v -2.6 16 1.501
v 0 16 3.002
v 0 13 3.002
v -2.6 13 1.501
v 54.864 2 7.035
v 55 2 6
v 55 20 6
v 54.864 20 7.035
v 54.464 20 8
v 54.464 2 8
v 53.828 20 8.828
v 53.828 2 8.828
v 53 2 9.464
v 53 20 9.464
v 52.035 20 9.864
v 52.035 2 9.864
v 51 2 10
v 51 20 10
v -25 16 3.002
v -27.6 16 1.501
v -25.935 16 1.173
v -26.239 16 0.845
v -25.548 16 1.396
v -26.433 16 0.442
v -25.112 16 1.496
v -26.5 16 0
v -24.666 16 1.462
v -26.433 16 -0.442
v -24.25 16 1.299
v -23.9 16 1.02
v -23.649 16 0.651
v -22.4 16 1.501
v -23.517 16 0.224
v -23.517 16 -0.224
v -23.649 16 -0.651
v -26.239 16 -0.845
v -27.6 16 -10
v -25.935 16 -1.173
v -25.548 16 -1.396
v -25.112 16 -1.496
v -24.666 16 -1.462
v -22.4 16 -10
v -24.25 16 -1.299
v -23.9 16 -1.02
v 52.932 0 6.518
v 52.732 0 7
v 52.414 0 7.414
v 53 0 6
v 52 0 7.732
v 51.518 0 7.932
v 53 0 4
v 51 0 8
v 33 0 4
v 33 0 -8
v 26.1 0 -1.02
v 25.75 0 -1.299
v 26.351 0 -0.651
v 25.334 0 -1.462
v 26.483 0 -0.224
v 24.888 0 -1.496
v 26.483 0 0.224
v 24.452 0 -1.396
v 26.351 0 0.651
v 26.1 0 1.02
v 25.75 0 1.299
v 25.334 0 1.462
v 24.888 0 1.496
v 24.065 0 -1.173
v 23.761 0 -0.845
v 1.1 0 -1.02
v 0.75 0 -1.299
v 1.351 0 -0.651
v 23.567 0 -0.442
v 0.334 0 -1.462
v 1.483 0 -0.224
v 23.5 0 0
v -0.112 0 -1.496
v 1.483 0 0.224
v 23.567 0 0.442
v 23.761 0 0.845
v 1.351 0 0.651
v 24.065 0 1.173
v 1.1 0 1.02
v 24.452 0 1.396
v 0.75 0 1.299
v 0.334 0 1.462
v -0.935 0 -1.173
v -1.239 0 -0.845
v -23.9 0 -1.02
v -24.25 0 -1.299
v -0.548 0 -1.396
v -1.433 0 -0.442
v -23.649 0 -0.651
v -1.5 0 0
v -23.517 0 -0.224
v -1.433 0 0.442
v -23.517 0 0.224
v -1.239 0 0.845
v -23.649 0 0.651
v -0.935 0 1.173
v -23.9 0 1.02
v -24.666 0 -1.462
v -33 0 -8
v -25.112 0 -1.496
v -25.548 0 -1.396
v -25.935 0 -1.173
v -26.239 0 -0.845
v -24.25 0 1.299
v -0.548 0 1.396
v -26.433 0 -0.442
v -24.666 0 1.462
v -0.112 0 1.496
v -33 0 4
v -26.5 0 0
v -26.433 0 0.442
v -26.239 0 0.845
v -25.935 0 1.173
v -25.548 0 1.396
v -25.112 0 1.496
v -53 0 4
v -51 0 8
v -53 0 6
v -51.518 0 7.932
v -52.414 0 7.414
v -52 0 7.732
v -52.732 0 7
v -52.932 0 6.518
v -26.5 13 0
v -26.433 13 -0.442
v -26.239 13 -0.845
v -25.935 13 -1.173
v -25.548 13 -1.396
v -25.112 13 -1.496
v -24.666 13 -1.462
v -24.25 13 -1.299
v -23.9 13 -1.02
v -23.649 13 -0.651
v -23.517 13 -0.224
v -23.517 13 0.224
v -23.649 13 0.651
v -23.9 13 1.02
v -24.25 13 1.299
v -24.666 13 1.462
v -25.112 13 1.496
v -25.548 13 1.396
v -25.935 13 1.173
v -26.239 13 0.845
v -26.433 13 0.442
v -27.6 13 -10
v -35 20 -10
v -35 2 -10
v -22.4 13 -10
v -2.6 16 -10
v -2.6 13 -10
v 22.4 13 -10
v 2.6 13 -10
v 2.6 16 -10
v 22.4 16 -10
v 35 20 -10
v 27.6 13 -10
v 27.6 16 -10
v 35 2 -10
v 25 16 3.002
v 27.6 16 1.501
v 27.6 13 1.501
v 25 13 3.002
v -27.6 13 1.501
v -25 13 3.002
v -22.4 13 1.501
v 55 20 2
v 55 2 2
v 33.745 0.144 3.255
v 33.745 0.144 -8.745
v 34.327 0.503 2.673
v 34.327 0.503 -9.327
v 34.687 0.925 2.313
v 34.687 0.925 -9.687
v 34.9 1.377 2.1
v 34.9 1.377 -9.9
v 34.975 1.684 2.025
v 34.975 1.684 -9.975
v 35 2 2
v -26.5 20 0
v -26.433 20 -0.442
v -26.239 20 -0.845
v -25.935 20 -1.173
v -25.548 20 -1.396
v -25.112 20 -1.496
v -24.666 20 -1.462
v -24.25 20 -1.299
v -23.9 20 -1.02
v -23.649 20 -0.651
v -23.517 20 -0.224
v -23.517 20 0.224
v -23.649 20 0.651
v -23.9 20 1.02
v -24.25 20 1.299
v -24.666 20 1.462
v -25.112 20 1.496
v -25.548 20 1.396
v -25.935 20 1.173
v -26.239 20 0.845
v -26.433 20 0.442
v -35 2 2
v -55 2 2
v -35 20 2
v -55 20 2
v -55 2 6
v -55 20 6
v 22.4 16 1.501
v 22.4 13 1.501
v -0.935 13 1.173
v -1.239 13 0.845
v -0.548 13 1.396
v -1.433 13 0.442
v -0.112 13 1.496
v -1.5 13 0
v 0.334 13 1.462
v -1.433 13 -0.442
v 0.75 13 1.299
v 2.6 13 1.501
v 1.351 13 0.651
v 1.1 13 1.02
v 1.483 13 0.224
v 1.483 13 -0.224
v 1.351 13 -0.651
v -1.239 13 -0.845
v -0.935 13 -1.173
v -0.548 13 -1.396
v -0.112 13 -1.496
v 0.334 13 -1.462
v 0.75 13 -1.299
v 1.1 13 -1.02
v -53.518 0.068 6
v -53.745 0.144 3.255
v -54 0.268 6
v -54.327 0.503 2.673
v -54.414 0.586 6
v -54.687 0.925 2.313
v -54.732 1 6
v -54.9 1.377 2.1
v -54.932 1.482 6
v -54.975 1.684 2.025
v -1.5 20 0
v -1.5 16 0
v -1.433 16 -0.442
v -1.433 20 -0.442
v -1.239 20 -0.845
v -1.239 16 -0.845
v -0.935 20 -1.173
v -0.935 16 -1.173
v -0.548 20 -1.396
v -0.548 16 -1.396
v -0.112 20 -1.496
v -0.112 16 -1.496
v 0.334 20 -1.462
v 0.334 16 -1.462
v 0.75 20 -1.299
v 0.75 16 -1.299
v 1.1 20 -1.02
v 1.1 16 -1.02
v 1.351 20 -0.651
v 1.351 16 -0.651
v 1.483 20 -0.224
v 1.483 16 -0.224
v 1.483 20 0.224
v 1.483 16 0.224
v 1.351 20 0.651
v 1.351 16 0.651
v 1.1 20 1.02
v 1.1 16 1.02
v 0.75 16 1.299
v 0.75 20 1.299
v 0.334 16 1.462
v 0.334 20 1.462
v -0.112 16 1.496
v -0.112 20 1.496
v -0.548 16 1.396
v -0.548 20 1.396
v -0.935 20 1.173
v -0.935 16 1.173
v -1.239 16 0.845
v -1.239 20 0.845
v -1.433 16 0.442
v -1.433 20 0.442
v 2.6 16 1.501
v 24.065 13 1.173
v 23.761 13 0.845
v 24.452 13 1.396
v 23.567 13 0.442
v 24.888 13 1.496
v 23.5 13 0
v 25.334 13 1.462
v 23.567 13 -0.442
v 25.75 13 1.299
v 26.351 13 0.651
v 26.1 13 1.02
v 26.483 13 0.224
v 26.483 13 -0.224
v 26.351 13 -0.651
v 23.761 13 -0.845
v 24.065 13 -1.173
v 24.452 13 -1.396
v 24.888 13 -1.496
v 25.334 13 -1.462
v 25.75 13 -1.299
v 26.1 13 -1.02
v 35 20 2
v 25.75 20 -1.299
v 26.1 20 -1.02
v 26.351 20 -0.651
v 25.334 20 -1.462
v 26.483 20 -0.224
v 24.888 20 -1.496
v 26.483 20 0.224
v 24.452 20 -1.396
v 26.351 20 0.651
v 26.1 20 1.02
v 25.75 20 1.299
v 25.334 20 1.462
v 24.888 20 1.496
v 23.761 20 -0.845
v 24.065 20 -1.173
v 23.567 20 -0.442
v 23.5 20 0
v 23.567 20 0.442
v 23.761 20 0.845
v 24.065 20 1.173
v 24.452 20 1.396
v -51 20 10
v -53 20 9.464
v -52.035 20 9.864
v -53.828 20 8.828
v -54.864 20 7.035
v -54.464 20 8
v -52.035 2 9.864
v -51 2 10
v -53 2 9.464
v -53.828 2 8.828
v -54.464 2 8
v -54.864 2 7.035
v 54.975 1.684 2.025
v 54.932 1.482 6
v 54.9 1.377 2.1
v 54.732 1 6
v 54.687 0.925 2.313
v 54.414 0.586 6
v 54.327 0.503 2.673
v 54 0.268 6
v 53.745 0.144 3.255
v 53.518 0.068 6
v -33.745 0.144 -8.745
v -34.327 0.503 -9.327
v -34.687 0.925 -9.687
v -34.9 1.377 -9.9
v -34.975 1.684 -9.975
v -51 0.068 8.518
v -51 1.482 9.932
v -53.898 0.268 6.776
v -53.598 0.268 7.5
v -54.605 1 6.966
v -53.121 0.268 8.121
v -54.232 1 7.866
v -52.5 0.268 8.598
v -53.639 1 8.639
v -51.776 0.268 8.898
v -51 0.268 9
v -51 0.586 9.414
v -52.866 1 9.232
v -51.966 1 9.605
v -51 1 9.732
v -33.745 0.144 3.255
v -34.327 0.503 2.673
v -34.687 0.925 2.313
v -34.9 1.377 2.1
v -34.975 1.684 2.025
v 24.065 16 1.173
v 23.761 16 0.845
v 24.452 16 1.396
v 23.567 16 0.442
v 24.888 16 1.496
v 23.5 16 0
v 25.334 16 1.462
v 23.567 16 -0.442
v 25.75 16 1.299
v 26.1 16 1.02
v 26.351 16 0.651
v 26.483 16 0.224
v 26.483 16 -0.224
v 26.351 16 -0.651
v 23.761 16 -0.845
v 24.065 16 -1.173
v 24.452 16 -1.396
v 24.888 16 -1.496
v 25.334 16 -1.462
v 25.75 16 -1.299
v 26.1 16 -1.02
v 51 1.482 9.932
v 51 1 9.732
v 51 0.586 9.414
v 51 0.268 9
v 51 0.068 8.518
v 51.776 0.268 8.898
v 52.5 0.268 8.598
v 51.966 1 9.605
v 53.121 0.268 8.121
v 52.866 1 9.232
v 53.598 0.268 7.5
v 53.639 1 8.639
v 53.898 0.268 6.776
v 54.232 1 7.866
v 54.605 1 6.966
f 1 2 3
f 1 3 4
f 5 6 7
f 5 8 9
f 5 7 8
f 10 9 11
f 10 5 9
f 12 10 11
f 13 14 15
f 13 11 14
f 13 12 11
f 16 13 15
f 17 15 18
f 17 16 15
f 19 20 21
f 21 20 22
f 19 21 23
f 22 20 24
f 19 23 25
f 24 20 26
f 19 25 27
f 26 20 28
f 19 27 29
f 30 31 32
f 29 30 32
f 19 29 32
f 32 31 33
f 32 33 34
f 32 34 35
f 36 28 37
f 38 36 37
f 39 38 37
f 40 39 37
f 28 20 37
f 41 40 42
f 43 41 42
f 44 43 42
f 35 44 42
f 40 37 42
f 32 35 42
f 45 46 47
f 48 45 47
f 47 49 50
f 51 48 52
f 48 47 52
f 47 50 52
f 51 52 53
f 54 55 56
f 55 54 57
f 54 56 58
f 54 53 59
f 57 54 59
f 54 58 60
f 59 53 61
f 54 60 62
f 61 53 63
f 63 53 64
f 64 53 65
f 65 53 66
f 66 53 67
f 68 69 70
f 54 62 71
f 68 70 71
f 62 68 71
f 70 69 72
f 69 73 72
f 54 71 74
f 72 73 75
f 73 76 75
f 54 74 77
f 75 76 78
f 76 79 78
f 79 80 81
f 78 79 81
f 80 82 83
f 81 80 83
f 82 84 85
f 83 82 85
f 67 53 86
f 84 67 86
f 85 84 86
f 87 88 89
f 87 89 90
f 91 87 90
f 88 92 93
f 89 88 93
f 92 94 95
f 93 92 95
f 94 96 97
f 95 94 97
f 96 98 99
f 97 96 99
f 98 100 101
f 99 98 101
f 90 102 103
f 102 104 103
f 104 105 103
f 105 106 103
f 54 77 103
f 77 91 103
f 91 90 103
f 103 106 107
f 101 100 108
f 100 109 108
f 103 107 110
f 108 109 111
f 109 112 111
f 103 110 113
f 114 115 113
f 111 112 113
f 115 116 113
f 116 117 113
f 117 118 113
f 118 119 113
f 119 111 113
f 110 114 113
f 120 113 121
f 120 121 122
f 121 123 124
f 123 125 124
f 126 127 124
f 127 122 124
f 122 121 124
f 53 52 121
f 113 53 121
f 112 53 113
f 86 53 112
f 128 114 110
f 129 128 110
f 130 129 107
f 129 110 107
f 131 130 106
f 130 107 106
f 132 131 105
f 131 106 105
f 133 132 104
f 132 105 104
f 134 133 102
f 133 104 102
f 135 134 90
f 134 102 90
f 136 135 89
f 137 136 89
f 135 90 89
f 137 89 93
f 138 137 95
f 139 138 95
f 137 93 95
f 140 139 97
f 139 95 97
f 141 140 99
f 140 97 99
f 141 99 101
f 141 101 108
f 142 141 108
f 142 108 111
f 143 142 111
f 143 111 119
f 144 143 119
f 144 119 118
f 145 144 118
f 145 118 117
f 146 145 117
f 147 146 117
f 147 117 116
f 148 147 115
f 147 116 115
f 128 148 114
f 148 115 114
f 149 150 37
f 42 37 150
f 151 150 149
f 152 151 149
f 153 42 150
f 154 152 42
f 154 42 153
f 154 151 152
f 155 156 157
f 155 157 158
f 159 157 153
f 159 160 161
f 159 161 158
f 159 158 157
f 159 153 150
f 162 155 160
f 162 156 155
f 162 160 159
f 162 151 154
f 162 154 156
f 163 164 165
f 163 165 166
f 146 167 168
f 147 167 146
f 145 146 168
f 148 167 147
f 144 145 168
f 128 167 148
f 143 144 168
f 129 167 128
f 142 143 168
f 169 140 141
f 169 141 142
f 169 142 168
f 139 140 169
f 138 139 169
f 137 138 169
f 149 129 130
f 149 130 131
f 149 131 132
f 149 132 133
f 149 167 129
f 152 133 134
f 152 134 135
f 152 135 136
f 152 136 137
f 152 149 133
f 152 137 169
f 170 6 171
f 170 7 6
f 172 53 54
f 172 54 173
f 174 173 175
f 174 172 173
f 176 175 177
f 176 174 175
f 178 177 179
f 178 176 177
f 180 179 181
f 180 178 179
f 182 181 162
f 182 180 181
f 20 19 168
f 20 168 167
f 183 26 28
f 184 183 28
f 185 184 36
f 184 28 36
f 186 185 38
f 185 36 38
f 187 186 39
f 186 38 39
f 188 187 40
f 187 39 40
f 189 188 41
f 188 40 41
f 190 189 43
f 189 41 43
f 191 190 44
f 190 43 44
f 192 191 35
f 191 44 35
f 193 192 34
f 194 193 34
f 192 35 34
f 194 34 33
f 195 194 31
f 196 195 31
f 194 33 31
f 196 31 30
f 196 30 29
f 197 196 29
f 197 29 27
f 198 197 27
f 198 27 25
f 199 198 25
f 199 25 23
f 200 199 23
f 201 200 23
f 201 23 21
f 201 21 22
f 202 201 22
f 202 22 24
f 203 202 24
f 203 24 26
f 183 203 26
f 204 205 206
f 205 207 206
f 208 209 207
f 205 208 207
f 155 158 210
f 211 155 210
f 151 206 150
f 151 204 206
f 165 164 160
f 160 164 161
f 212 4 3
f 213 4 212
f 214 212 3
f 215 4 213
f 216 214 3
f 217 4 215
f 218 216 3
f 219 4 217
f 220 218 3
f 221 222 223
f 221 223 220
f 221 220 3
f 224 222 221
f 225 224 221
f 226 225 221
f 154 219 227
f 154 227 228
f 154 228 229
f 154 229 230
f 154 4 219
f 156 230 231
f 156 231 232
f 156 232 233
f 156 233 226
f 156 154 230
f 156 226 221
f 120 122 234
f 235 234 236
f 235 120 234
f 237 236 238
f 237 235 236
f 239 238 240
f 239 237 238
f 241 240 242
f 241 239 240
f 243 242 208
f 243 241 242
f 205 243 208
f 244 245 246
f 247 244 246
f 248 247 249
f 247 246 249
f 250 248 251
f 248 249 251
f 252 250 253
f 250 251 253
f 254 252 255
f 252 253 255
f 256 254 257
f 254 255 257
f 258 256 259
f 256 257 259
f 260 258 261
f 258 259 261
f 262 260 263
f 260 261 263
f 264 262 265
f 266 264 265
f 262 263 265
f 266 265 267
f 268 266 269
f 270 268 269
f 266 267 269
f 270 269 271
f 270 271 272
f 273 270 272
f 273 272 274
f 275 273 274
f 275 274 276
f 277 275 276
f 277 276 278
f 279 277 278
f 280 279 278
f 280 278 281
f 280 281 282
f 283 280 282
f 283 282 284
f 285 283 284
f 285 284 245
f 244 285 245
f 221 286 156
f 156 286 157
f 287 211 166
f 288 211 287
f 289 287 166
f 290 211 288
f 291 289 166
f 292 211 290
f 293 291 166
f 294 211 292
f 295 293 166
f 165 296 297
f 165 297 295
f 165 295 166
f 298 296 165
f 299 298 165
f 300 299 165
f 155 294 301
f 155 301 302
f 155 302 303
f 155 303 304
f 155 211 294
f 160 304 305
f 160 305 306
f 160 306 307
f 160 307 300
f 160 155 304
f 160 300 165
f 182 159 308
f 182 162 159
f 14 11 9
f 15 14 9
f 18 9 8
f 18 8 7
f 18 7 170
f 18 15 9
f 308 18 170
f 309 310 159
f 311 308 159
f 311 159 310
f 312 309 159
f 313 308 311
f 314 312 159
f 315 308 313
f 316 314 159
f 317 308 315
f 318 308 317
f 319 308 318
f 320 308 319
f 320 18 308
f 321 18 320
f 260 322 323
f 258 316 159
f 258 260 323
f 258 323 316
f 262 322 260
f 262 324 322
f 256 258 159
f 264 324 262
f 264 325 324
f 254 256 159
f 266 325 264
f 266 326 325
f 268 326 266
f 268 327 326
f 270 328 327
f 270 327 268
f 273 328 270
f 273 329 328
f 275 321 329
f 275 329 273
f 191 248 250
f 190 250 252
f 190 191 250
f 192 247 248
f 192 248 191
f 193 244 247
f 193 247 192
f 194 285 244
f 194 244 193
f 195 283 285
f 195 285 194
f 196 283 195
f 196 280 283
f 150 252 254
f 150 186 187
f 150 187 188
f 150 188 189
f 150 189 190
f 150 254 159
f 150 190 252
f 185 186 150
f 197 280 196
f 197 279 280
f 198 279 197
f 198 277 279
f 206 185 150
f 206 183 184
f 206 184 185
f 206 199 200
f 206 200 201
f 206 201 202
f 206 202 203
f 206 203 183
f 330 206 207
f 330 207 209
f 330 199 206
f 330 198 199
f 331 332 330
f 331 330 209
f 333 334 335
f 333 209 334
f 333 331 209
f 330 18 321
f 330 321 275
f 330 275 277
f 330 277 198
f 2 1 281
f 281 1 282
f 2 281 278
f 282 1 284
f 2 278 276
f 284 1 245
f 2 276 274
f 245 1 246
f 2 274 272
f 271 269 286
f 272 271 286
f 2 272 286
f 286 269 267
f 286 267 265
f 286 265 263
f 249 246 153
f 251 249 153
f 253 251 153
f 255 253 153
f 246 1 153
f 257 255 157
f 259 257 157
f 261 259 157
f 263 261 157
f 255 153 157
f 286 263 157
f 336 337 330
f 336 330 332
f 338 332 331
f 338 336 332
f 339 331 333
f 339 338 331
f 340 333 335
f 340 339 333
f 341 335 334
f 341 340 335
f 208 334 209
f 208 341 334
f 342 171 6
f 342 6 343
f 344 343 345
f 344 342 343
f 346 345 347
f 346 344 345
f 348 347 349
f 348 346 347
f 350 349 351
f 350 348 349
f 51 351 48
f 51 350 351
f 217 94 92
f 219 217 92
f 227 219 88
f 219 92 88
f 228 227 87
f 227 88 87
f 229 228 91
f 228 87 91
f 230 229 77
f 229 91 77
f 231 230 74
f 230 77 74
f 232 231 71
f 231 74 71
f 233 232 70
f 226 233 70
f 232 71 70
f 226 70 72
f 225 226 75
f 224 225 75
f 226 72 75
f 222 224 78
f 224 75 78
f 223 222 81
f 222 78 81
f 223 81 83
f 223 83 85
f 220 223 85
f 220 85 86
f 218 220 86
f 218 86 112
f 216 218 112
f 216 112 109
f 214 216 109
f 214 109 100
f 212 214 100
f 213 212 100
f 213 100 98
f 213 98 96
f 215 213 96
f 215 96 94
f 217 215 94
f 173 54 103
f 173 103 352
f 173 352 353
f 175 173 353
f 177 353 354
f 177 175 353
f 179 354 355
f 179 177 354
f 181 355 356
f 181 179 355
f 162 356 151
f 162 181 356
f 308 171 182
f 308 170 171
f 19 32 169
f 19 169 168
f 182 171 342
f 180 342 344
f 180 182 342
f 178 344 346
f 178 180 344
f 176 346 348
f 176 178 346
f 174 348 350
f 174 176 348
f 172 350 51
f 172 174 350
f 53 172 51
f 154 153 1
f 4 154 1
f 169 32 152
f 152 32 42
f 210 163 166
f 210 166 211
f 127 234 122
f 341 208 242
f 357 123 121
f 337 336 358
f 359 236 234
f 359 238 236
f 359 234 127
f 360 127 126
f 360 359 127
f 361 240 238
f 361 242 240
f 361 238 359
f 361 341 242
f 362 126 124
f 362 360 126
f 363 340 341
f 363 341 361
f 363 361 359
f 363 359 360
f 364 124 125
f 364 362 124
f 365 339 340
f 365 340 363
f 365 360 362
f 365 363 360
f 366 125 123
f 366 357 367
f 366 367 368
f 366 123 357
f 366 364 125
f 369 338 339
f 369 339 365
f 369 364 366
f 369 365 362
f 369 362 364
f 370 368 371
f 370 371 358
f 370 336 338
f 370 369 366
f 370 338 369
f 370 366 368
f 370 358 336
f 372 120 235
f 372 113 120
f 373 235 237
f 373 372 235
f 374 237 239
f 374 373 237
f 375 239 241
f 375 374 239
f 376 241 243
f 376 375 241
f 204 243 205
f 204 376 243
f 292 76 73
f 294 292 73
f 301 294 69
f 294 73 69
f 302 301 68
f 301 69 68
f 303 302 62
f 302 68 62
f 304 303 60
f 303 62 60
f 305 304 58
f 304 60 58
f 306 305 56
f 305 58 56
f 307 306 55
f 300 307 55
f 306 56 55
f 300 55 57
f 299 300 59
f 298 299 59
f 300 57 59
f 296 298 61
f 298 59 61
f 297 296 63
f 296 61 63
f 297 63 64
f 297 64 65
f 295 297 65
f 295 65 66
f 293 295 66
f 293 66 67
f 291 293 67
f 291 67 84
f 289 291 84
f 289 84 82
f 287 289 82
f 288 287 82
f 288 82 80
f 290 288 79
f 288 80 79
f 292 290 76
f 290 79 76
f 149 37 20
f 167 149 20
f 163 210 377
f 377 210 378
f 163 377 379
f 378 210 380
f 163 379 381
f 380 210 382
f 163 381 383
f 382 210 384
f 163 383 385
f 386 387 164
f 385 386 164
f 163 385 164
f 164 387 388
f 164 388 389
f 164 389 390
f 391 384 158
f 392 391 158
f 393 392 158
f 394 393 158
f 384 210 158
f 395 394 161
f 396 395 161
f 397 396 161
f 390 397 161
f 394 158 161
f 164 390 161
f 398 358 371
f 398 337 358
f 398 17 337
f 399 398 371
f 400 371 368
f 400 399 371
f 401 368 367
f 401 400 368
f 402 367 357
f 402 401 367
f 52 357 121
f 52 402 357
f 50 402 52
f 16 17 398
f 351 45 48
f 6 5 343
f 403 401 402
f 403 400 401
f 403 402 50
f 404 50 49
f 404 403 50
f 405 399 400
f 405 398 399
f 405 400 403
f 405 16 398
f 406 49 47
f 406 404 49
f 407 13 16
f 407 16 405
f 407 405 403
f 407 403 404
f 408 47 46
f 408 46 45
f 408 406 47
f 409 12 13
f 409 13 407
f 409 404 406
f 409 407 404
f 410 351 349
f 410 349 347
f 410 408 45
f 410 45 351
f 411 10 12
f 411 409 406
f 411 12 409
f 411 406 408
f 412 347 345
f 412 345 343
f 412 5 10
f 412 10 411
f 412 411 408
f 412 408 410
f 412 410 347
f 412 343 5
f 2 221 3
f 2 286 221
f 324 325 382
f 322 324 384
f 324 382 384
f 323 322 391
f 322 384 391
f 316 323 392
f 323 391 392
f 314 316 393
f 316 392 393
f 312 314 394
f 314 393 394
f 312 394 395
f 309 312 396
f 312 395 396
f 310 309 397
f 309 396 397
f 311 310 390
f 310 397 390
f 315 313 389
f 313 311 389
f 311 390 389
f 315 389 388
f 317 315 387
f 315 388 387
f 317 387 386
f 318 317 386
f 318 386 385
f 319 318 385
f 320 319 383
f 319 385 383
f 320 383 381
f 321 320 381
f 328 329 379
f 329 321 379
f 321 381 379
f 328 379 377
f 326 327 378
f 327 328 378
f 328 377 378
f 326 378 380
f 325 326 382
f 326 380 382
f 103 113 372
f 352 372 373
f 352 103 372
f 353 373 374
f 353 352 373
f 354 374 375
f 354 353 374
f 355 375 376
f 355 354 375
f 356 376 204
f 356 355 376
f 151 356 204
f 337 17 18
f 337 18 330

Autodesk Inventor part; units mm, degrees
ref_plane "YZ Plane" through (0, 0, 0) normal (1, 0, 0) x (0, 1, 0)
ref_plane "XZ Plane" through (0, 0, 0) normal (0, 1, 0) x (-1, 0, 0)
sketch "Sketch1" plane through (0, 0, 0) normal (0, 1, 0) x (-1, 0, 0)
  line L0 (-35, 10) -> (35, 10)
  line L1 (35, 10) -> (35, -10)
  line L2 (35, -10) -> (-35, -10)
  line L3 (-35, -10) -> (-35, 10)
  line L4 (-35, 10) -> (35, -10) construction
  line L5 (35, 10) -> (-35, -10) construction
  line L6 (0, 0) -> (25, 0)
  line L7 (0, 0) -> (-25, 0)
  circle A0 centre (25, 0) radius 1.5
  circle A1 centre (-25, 0) radius 1.5
  circle A2 centre (0, 0) radius 1.5
  dimension "d0" = 70
  dimension "d1" = 20
  dimension "d2" = 25
  dimension "d3" = 25
  dimension "d4" = 3
  dimension "d5" = 3
  dimension "d8" = 3
extrude "Extrusion1" add sketch "Sketch1" along normal blind 20
sketch "Sketch2" plane through (0, 20, 0) normal (0, 1, 0) x (1, 0, 0)
  circle A0 centre (0, 0) radius 1.5 projected
  circle A1 centre (25, 0) radius 1.5 projected
  circle A2 centre (-25, 0) radius 1.5 projected
  line L0 (-35, -10) -> (35, -10) projected
  line L1 (35, -10) -> (35, 10) projected
  line L2 (35, 10) -> (-35, 10) projected
  line L3 (-35, 10) -> (-35, -10) projected
  line L4 (-35, 10) -> (-35, -10) projected
  line L5 (-35, -10) -> (-55, -10)
  line L6 (-55, -10) -> (-55, -2)
  line L7 (-55, -2) -> (-35, -2)
  line L8 (-35, -2) -> (-35, -10)
  line L9 (35, -10) -> (55, -10)
  line L10 (55, -10) -> (55, -2)
  line L11 (55, -2) -> (35, -2)
  line L12 (35, -2) -> (35, -10)
  dimension "d9" = 20
  dimension "d10" = 8
  dimension "d11" = 20
  dimension "d12" = 8
extrude "Extrusion2" add sketch "Sketch2" against normal up to surface (20 mm away) contours L5 L6 L7 L3 | L1 L11 L10 L9
ref_plane "Work Plane1" through (0, 16, 0) normal (0, 1, 0) x (1, 0, 0)
sketch "Sketch3" plane through (0, 16, 0) normal (0, 1, 0) x (1, 0, 0)
  circle A0 centre (0, 0) radius 1.5 construction
  circle A1 centre (25, 0) radius 1.5 construction
  circle A2 centre (-25, 0) radius 1.5 construction
  line L0 (-55, -10) -> (55, -10) construction
  line L1 (55, -10) -> (55, -2) construction
  line L2 (55, -2) -> (35, -2) construction
  line L3 (35, -2) -> (35, 10) construction
  line L4 (35, 10) -> (-35, 10) construction
  line L5 (-35, 10) -> (-35, -2) construction
  line L6 (-35, -2) -> (-55, -2) construction
  line L7 (-55, -2) -> (-55, -10) construction
  circle A3 centre (-25, 0) radius 1.5 construction
  line L8 (-25, 0) -> (-27.6, 0) construction
  line L9 (-27.6, 1.5011) -> (-25, 3.0022)
  line L10 (-25, 3.0022) -> (-22.4, 1.5011)
  line L11 (-22.4, 1.5011) -> (-22.4, -1.5011)
  line L12 (-22.4, -1.5011) -> (-25, -3.0022)
  line L13 (-25, -3.0022) -> (-27.6, -1.5011)
  line L14 (-27.6, -1.5011) -> (-27.6, 1.5011)
  line L15 (-35, 10) -> (35, 10) projected
  line L16 (-27.6, 1.5011) -> (-22.4, 1.5011)
  line L17 (-22.4, 1.5011) -> (-22.4, 10)
  line L18 (-22.4, 10) -> (-27.6, 10)
  line L19 (-27.6, 10) -> (-27.6, 1.5011)
  dimension "d17" = 2.6
extrude "Extrusion3" cut sketch "Sketch3" against normal blind 3
pattern_linear "Rectangular Pattern1" count 3 spacing 25 along (1, 0, 0) of "Extrusion3"
fillet "Fillet1" radius 2 8 edges at (0, 0, 10) (0, 0, -10) (-35, 0, -4) (-45, 0, 2) (-55, 0, 6) (35, 0, -4) (45, 0, 2) (55, 0, 6)
fillet "Fillet1" radius 4 2 edges at (55, 10, 10) (-55, 10, 10)
properties part number "foot_front"
